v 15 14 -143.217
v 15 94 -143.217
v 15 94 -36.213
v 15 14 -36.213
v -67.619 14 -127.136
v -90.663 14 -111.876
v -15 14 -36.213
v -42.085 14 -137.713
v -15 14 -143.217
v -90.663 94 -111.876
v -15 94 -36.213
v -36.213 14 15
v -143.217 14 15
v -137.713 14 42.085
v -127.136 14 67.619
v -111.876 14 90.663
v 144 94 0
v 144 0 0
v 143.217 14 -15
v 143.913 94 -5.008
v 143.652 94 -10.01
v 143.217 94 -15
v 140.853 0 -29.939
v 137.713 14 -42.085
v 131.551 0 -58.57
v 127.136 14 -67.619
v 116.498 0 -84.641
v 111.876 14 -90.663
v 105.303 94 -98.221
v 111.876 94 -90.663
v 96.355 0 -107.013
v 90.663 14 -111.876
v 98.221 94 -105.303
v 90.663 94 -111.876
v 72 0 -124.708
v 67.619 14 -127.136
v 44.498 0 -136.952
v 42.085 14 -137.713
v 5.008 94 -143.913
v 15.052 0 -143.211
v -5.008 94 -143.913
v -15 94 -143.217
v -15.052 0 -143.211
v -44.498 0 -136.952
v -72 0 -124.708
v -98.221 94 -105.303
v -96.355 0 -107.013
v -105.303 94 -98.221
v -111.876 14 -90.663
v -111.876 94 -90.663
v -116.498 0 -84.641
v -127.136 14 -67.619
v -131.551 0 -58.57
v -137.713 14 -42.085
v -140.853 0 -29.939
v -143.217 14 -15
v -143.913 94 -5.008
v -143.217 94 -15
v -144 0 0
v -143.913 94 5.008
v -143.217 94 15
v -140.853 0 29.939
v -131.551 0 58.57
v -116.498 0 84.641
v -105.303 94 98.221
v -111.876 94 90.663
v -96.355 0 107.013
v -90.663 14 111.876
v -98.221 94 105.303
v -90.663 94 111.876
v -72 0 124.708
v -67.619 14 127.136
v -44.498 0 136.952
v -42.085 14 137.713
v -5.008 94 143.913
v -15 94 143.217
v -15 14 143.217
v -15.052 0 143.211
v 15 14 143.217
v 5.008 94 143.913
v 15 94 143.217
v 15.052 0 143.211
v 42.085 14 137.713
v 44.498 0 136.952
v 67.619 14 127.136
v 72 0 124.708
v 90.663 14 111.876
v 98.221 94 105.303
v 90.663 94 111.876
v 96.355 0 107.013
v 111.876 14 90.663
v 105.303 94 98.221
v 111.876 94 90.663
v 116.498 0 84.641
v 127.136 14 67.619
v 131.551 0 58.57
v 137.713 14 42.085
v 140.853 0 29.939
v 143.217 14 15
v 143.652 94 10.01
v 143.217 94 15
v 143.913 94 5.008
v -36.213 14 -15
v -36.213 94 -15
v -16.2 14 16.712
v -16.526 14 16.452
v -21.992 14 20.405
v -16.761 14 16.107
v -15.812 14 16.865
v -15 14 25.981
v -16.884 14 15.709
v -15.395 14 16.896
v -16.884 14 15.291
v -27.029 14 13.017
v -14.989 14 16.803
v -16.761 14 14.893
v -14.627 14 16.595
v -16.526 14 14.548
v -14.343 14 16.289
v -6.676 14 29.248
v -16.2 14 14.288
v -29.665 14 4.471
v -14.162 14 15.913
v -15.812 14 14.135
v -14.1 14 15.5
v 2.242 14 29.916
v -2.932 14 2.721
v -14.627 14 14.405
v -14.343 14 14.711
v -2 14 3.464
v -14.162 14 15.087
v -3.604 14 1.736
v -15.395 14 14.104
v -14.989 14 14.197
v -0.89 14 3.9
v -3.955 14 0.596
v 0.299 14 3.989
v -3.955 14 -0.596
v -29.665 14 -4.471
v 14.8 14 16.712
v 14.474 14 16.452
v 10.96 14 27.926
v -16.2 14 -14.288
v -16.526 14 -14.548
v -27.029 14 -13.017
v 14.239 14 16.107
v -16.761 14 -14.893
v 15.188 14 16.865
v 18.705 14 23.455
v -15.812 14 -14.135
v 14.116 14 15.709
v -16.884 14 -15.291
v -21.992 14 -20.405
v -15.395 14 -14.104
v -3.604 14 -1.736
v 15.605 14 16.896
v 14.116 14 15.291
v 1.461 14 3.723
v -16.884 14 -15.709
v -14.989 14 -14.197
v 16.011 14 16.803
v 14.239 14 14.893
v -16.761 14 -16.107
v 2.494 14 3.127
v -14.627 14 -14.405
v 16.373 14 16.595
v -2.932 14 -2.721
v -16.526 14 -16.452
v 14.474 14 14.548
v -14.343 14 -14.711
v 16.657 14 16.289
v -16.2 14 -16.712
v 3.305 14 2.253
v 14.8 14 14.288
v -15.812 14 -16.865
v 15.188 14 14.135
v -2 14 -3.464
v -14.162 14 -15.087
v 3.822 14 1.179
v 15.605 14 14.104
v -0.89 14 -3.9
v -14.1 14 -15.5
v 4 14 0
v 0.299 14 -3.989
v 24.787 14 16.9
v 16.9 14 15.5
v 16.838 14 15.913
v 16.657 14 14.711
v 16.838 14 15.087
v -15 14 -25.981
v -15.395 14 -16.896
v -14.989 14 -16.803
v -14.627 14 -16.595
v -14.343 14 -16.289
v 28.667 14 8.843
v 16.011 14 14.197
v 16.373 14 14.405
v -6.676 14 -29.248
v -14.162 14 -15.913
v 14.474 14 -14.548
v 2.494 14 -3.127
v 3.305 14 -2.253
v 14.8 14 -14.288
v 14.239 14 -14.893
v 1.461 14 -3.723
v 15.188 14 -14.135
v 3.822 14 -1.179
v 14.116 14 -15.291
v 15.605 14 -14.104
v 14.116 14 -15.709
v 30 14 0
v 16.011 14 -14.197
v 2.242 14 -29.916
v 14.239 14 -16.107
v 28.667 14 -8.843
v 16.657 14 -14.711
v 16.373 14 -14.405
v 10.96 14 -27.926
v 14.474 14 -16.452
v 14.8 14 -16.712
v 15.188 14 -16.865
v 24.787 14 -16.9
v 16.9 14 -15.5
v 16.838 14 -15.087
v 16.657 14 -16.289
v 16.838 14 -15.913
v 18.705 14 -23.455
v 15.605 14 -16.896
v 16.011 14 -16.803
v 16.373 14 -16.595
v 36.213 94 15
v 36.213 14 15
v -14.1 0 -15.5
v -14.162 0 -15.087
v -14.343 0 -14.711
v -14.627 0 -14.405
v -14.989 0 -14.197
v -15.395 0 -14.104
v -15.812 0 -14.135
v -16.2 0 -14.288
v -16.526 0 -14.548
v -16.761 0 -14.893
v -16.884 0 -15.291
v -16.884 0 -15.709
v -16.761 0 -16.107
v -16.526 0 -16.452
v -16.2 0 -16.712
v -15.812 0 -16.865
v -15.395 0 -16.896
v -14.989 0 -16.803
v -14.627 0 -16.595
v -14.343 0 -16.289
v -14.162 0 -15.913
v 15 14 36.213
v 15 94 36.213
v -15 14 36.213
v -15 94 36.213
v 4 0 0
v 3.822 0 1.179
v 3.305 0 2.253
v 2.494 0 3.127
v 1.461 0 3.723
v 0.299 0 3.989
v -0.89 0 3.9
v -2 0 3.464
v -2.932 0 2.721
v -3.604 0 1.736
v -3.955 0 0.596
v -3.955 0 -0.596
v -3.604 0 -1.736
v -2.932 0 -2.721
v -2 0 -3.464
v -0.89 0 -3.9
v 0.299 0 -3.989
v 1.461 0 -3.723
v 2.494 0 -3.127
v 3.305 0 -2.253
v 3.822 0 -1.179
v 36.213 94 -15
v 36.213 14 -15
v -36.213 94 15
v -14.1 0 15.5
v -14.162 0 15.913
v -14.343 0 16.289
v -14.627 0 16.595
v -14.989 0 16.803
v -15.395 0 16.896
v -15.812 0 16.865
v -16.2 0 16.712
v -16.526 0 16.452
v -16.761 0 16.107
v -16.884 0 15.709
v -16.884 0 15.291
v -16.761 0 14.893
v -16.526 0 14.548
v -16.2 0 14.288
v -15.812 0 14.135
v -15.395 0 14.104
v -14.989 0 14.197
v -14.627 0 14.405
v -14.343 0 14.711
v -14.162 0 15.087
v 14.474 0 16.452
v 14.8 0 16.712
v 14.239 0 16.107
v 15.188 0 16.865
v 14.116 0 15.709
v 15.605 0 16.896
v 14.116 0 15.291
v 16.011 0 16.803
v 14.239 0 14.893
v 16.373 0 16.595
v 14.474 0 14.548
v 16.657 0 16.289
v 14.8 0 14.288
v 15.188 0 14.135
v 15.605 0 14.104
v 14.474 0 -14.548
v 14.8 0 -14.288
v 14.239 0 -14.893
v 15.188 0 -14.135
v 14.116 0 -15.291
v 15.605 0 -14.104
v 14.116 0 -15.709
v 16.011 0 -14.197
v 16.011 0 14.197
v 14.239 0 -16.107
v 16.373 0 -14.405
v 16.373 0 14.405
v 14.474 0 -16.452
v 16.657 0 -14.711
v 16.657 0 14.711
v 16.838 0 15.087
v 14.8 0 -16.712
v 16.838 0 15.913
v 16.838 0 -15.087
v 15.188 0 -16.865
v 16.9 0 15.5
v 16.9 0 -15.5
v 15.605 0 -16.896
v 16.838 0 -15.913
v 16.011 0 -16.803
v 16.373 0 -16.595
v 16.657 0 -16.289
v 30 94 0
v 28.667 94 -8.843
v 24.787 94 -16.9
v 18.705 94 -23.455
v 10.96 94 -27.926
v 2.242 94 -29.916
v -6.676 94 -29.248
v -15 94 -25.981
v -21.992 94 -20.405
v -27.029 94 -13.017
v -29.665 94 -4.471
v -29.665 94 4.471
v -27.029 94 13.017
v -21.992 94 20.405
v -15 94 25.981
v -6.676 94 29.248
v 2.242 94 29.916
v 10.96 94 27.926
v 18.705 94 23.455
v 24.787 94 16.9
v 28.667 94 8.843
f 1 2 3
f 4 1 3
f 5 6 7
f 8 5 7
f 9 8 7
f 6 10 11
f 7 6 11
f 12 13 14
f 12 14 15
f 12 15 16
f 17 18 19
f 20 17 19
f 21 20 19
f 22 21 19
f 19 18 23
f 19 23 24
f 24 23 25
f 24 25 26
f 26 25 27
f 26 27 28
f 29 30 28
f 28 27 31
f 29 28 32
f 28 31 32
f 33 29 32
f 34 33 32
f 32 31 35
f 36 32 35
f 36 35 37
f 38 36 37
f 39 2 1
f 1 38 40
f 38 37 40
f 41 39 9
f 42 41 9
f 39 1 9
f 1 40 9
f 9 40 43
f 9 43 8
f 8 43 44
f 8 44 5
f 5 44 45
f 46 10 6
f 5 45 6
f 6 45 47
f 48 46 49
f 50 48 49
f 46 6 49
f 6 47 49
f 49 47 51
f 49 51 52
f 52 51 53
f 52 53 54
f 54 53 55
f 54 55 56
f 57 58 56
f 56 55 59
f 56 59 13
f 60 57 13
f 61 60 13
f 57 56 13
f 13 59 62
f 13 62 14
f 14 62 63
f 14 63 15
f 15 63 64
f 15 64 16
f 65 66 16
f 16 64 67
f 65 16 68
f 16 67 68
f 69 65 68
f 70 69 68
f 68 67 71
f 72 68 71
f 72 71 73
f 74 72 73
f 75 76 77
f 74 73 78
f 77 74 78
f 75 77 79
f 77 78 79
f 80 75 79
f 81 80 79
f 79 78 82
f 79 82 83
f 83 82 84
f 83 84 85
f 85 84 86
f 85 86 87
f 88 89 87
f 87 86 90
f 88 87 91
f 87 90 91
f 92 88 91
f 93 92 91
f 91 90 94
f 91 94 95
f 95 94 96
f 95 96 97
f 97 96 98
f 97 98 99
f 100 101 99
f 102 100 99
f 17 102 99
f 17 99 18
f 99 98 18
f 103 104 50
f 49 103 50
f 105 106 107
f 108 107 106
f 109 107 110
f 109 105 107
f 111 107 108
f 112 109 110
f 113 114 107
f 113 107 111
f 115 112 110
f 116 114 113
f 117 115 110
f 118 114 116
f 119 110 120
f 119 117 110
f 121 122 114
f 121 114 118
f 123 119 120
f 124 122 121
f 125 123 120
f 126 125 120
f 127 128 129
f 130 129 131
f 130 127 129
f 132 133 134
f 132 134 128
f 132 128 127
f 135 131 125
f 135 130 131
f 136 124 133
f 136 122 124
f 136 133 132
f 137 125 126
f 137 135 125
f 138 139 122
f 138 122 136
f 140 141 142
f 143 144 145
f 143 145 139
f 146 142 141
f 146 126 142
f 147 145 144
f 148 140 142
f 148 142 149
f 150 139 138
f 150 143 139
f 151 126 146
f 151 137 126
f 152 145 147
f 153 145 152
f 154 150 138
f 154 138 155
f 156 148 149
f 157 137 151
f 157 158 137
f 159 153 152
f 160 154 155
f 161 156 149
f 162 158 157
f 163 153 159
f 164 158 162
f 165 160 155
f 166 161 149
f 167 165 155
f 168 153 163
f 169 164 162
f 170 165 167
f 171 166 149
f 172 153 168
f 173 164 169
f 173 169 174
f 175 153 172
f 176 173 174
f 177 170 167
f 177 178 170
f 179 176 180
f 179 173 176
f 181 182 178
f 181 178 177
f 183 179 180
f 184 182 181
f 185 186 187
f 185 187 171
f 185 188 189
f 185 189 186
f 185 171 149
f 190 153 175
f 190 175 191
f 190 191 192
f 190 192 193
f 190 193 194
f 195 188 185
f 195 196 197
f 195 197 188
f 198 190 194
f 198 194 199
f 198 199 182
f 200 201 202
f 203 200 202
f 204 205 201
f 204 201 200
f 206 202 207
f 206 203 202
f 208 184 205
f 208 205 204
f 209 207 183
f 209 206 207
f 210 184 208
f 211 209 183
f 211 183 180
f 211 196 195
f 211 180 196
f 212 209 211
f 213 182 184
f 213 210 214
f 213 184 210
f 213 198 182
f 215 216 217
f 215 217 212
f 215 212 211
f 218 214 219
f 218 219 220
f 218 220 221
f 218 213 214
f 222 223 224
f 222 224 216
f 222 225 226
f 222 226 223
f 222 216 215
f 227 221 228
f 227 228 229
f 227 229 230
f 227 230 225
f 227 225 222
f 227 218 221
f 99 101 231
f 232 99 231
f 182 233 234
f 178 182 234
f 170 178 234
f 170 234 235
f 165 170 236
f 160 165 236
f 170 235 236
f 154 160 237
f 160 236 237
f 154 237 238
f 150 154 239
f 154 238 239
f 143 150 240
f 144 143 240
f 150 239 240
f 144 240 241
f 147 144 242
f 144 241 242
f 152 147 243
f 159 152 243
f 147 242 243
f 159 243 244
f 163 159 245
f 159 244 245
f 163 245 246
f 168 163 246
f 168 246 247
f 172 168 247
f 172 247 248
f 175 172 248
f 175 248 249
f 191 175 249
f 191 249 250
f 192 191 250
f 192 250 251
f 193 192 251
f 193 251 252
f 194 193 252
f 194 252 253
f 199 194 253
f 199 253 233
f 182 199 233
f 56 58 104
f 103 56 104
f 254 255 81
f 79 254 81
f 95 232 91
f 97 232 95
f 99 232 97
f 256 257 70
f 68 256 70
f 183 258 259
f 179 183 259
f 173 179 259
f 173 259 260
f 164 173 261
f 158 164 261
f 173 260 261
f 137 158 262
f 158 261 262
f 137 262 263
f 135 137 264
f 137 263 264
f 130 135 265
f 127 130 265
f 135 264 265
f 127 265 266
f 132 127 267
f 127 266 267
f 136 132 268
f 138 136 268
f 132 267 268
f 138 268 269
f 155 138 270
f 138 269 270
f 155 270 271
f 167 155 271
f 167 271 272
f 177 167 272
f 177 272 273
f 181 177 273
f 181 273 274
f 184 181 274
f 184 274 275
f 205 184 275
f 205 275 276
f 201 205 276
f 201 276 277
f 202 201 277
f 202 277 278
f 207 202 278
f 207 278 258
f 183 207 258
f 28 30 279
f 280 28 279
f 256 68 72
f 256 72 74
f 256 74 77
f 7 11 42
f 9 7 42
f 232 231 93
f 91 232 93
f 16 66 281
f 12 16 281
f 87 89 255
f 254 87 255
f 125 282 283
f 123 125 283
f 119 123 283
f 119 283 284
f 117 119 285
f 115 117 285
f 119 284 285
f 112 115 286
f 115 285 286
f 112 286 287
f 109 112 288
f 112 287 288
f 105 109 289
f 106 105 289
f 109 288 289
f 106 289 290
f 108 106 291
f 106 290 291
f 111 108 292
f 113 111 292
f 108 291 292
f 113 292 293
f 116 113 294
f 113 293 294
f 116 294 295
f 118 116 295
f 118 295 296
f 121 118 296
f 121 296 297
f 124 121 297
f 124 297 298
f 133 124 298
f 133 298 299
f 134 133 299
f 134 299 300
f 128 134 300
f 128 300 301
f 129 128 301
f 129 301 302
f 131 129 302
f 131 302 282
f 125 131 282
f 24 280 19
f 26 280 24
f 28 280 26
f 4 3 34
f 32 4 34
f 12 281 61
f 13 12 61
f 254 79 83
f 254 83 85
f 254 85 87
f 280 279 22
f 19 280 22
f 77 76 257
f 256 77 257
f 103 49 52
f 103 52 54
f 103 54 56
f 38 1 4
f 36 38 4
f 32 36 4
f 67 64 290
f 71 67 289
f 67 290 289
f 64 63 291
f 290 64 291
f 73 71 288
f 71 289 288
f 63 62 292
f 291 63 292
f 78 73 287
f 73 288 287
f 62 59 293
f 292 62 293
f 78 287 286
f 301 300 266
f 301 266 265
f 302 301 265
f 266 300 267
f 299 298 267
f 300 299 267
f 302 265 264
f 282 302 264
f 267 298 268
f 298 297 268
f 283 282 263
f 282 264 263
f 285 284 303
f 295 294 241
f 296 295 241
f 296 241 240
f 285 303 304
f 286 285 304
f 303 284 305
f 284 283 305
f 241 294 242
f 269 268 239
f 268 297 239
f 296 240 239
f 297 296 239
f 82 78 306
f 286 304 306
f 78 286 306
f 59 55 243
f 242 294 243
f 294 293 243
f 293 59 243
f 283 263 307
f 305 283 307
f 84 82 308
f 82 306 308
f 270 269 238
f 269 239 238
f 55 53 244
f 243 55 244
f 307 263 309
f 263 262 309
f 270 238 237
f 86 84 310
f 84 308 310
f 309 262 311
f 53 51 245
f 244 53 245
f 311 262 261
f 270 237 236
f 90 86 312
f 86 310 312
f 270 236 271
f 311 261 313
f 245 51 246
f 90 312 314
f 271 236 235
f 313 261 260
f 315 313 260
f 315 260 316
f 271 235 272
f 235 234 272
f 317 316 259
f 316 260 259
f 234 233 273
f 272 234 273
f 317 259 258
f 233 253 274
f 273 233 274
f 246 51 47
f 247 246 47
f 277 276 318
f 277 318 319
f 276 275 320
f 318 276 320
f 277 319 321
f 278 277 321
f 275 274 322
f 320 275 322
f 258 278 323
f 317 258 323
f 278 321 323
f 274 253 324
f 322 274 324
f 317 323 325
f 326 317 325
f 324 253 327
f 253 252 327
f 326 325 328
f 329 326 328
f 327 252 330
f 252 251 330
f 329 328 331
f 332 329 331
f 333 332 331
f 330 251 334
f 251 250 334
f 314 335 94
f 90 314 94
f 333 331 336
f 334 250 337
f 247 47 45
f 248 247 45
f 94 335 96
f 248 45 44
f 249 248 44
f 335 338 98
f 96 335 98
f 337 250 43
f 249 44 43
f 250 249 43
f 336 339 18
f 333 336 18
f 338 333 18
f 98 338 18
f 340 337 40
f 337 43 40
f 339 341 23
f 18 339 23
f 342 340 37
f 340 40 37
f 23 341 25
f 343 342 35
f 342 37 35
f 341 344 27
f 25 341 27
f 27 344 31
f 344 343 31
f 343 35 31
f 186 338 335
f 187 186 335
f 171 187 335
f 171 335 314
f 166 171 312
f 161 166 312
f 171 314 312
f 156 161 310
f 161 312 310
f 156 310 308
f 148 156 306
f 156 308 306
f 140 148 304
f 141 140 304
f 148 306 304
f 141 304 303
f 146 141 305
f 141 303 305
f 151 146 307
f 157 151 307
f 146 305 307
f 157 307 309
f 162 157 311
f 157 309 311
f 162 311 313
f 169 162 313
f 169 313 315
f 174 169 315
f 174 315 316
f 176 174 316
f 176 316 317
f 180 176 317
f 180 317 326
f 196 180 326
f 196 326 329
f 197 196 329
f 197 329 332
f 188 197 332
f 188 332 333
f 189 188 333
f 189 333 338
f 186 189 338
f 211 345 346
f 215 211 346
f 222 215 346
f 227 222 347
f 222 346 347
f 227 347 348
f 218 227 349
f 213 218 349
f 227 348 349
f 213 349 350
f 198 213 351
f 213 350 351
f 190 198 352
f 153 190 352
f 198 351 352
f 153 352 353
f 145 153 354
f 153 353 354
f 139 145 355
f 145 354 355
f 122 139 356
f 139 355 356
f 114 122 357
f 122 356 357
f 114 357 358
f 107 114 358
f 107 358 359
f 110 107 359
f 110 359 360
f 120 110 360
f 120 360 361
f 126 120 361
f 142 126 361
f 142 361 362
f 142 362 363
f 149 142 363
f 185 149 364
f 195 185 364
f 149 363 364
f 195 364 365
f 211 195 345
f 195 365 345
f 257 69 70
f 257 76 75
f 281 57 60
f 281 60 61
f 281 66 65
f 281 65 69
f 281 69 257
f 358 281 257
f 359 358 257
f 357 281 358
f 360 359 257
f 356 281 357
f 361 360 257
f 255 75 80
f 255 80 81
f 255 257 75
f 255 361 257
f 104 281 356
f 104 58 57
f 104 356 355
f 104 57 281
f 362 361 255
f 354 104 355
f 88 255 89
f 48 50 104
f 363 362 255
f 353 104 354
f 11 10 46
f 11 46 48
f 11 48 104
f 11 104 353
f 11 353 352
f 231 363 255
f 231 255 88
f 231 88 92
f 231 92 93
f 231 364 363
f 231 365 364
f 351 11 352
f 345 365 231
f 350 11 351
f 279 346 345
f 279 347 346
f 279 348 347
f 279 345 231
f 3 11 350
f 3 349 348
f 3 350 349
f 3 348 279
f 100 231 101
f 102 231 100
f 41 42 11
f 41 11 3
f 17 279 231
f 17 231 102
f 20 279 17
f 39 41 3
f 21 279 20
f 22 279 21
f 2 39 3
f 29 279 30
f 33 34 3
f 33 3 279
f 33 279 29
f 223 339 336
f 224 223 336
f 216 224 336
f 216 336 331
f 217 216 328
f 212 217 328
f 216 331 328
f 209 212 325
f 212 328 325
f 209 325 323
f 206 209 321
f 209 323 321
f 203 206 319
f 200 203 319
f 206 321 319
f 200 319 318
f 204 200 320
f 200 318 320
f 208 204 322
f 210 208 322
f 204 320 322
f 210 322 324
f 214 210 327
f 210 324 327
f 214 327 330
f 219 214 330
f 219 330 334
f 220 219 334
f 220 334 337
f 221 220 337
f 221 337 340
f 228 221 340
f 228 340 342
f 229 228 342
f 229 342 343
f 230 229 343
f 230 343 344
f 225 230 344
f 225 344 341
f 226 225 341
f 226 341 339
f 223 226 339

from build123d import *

# Parameters (mm, degrees)
SKETCH1_R           = 144
BOSS_EXTRUDE1_DEPTH = 94
CUT_EXTRUDE1_DEPTH  = 80
SKETCH3_R           = 4
CUT_EXTRUDE2_DEPTH  = 20
CUT_EXTRUDE3_REACH  = 96
SKETCH4_R           = 1.4
SKETCH5_R           = 30
CUT_EXTRUDE4_DEPTH  = 80


with BuildPart() as part:
    # Sketch1 → Boss-Extrude1 (new body)
    with BuildSketch(Plane(origin=(0, 0, 0), x_dir=(1, 0, 0), z_dir=(0, 1, 0))):
        Circle(SKETCH1_R)
    extrude(amount=BOSS_EXTRUDE1_DEPTH)

    # Sketch2 → Cut-Extrude1 (cut)
    with BuildSketch(Plane(origin=(0, 94, 0), x_dir=(1, 0, 0), z_dir=(0, 1, 0))):
        with BuildLine():
            Line((-15, 36.213203436), (-15, 143.216619147))
            ThreePointArc((-15, 143.216619147), (-55.106414261, 133.038652682), (-90.66284086, 111.876044296))
            Line((-90.66284086, 111.876044296), (-15, 36.213203436))
        make_face()
        with BuildLine():
            Line((15, 36.213203436), (90.66284086, 111.876044296))
            ThreePointArc((90.66284086, 111.876044296), (55.106414261, 133.038652682), (15, 143.216619147))
            Line((15, 143.216619147), (15, 36.213203436))
        make_face()
        with BuildLine():
            ThreePointArc((143.216619147, 15), (133.038652682, 55.106414261), (111.876044296, 90.66284086))
            Line((111.876044296, 90.66284086), (36.213203436, 15))
            Line((36.213203436, 15), (143.216619147, 15))
        make_face()
        with BuildLine():
            ThreePointArc((111.876044296, -90.66284086), (133.038652682, -55.106414261), (143.216619147, -15))
            Line((143.216619147, -15), (36.213203436, -15))
            Line((36.213203436, -15), (111.876044296, -90.66284086))
        make_face()
        with BuildLine():
            ThreePointArc((15, -143.216619147), (55.106414261, -133.038652682), (90.66284086, -111.876044296))
            Line((90.66284086, -111.876044296), (15, -36.213203436))
            Line((15, -36.213203436), (15, -143.216619147))
        make_face()
        with BuildLine():
            ThreePointArc((-90.66284086, -111.876044296), (-55.106414261, -133.038652682), (-15, -143.216619147))
            Line((-15, -143.216619147), (-15, -36.213203436))
            Line((-15, -36.213203436), (-90.66284086, -111.876044296))
        make_face()
        with BuildLine():
            Line((-36.213203436, -15), (-143.216619147, -15))
            ThreePointArc((-143.216619147, -15), (-133.038652682, -55.106414261), (-111.876044296, -90.66284086))
            Line((-111.876044296, -90.66284086), (-36.213203436, -15))
        make_face()
        with BuildLine():
            Line((-36.213203436, 15), (-111.876044296, 90.66284086))
            ThreePointArc((-111.876044296, 90.66284086), (-133.038652682, 55.106414261), (-143.216619147, 15))
            Line((-143.216619147, 15), (-36.213203436, 15))
        make_face()
    extrude(amount=-CUT_EXTRUDE1_DEPTH, mode=Mode.SUBTRACT)

    # Sketch3 → Cut-Extrude2 (cut)
    with BuildSketch(Plane.XZ):
        Circle(SKETCH3_R)
    extrude(amount=-CUT_EXTRUDE2_DEPTH, mode=Mode.SUBTRACT)

    # Sketch4 → Cut-Extrude3 (cut, up to next)
    with BuildSketch(Plane.XZ, mode=Mode.PRIVATE) as cut_extrude3_sk1:
        with Locations((15.5, -15.5)):
            Circle(SKETCH4_R)
    cut_extrude3_tool1 = extrude(cut_extrude3_sk1.sketch, amount=-CUT_EXTRUDE3_REACH, mode=Mode.PRIVATE) & part.part
    add(cut_extrude3_tool1.solids().sort_by_distance((15.5, 0, -15.5))[0], mode=Mode.SUBTRACT)
    # Sketch4 → Cut-Extrude3 (cut, up to next)
    with BuildSketch(Plane.XZ, mode=Mode.PRIVATE) as cut_extrude3_sk2:
        with Locations((15.5, 15.5)):
            Circle(SKETCH4_R)
    cut_extrude3_tool2 = extrude(cut_extrude3_sk2.sketch, amount=-CUT_EXTRUDE3_REACH, mode=Mode.PRIVATE) & part.part
    add(cut_extrude3_tool2.solids().sort_by_distance((15.5, 0, 15.5))[0], mode=Mode.SUBTRACT)
    # Sketch4 → Cut-Extrude3 (cut, up to next)
    with BuildSketch(Plane.XZ, mode=Mode.PRIVATE) as cut_extrude3_sk3:
        with Locations((-15.5, 15.5)):
            Circle(SKETCH4_R)
    cut_extrude3_tool3 = extrude(cut_extrude3_sk3.sketch, amount=-CUT_EXTRUDE3_REACH, mode=Mode.PRIVATE) & part.part
    add(cut_extrude3_tool3.solids().sort_by_distance((-15.5, 0, 15.5))[0], mode=Mode.SUBTRACT)
    # Sketch4 → Cut-Extrude3 (cut, up to next)
    with BuildSketch(Plane.XZ, mode=Mode.PRIVATE) as cut_extrude3_sk4:
        with Locations((-15.5, -15.5)):
            Circle(SKETCH4_R)
    cut_extrude3_tool4 = extrude(cut_extrude3_sk4.sketch, amount=-CUT_EXTRUDE3_REACH, mode=Mode.PRIVATE) & part.part
    add(cut_extrude3_tool4.solids().sort_by_distance((-15.5, 0, -15.5))[0], mode=Mode.SUBTRACT)

    # Sketch5 → Cut-Extrude4 (cut)
    with BuildSketch(Plane(origin=(0, 94, 0), x_dir=(1, 0, 0), z_dir=(0, 1, 0))):
        Circle(SKETCH5_R)
    extrude(amount=-CUT_EXTRUDE4_DEPTH, mode=Mode.SUBTRACT)


solid = part.part
